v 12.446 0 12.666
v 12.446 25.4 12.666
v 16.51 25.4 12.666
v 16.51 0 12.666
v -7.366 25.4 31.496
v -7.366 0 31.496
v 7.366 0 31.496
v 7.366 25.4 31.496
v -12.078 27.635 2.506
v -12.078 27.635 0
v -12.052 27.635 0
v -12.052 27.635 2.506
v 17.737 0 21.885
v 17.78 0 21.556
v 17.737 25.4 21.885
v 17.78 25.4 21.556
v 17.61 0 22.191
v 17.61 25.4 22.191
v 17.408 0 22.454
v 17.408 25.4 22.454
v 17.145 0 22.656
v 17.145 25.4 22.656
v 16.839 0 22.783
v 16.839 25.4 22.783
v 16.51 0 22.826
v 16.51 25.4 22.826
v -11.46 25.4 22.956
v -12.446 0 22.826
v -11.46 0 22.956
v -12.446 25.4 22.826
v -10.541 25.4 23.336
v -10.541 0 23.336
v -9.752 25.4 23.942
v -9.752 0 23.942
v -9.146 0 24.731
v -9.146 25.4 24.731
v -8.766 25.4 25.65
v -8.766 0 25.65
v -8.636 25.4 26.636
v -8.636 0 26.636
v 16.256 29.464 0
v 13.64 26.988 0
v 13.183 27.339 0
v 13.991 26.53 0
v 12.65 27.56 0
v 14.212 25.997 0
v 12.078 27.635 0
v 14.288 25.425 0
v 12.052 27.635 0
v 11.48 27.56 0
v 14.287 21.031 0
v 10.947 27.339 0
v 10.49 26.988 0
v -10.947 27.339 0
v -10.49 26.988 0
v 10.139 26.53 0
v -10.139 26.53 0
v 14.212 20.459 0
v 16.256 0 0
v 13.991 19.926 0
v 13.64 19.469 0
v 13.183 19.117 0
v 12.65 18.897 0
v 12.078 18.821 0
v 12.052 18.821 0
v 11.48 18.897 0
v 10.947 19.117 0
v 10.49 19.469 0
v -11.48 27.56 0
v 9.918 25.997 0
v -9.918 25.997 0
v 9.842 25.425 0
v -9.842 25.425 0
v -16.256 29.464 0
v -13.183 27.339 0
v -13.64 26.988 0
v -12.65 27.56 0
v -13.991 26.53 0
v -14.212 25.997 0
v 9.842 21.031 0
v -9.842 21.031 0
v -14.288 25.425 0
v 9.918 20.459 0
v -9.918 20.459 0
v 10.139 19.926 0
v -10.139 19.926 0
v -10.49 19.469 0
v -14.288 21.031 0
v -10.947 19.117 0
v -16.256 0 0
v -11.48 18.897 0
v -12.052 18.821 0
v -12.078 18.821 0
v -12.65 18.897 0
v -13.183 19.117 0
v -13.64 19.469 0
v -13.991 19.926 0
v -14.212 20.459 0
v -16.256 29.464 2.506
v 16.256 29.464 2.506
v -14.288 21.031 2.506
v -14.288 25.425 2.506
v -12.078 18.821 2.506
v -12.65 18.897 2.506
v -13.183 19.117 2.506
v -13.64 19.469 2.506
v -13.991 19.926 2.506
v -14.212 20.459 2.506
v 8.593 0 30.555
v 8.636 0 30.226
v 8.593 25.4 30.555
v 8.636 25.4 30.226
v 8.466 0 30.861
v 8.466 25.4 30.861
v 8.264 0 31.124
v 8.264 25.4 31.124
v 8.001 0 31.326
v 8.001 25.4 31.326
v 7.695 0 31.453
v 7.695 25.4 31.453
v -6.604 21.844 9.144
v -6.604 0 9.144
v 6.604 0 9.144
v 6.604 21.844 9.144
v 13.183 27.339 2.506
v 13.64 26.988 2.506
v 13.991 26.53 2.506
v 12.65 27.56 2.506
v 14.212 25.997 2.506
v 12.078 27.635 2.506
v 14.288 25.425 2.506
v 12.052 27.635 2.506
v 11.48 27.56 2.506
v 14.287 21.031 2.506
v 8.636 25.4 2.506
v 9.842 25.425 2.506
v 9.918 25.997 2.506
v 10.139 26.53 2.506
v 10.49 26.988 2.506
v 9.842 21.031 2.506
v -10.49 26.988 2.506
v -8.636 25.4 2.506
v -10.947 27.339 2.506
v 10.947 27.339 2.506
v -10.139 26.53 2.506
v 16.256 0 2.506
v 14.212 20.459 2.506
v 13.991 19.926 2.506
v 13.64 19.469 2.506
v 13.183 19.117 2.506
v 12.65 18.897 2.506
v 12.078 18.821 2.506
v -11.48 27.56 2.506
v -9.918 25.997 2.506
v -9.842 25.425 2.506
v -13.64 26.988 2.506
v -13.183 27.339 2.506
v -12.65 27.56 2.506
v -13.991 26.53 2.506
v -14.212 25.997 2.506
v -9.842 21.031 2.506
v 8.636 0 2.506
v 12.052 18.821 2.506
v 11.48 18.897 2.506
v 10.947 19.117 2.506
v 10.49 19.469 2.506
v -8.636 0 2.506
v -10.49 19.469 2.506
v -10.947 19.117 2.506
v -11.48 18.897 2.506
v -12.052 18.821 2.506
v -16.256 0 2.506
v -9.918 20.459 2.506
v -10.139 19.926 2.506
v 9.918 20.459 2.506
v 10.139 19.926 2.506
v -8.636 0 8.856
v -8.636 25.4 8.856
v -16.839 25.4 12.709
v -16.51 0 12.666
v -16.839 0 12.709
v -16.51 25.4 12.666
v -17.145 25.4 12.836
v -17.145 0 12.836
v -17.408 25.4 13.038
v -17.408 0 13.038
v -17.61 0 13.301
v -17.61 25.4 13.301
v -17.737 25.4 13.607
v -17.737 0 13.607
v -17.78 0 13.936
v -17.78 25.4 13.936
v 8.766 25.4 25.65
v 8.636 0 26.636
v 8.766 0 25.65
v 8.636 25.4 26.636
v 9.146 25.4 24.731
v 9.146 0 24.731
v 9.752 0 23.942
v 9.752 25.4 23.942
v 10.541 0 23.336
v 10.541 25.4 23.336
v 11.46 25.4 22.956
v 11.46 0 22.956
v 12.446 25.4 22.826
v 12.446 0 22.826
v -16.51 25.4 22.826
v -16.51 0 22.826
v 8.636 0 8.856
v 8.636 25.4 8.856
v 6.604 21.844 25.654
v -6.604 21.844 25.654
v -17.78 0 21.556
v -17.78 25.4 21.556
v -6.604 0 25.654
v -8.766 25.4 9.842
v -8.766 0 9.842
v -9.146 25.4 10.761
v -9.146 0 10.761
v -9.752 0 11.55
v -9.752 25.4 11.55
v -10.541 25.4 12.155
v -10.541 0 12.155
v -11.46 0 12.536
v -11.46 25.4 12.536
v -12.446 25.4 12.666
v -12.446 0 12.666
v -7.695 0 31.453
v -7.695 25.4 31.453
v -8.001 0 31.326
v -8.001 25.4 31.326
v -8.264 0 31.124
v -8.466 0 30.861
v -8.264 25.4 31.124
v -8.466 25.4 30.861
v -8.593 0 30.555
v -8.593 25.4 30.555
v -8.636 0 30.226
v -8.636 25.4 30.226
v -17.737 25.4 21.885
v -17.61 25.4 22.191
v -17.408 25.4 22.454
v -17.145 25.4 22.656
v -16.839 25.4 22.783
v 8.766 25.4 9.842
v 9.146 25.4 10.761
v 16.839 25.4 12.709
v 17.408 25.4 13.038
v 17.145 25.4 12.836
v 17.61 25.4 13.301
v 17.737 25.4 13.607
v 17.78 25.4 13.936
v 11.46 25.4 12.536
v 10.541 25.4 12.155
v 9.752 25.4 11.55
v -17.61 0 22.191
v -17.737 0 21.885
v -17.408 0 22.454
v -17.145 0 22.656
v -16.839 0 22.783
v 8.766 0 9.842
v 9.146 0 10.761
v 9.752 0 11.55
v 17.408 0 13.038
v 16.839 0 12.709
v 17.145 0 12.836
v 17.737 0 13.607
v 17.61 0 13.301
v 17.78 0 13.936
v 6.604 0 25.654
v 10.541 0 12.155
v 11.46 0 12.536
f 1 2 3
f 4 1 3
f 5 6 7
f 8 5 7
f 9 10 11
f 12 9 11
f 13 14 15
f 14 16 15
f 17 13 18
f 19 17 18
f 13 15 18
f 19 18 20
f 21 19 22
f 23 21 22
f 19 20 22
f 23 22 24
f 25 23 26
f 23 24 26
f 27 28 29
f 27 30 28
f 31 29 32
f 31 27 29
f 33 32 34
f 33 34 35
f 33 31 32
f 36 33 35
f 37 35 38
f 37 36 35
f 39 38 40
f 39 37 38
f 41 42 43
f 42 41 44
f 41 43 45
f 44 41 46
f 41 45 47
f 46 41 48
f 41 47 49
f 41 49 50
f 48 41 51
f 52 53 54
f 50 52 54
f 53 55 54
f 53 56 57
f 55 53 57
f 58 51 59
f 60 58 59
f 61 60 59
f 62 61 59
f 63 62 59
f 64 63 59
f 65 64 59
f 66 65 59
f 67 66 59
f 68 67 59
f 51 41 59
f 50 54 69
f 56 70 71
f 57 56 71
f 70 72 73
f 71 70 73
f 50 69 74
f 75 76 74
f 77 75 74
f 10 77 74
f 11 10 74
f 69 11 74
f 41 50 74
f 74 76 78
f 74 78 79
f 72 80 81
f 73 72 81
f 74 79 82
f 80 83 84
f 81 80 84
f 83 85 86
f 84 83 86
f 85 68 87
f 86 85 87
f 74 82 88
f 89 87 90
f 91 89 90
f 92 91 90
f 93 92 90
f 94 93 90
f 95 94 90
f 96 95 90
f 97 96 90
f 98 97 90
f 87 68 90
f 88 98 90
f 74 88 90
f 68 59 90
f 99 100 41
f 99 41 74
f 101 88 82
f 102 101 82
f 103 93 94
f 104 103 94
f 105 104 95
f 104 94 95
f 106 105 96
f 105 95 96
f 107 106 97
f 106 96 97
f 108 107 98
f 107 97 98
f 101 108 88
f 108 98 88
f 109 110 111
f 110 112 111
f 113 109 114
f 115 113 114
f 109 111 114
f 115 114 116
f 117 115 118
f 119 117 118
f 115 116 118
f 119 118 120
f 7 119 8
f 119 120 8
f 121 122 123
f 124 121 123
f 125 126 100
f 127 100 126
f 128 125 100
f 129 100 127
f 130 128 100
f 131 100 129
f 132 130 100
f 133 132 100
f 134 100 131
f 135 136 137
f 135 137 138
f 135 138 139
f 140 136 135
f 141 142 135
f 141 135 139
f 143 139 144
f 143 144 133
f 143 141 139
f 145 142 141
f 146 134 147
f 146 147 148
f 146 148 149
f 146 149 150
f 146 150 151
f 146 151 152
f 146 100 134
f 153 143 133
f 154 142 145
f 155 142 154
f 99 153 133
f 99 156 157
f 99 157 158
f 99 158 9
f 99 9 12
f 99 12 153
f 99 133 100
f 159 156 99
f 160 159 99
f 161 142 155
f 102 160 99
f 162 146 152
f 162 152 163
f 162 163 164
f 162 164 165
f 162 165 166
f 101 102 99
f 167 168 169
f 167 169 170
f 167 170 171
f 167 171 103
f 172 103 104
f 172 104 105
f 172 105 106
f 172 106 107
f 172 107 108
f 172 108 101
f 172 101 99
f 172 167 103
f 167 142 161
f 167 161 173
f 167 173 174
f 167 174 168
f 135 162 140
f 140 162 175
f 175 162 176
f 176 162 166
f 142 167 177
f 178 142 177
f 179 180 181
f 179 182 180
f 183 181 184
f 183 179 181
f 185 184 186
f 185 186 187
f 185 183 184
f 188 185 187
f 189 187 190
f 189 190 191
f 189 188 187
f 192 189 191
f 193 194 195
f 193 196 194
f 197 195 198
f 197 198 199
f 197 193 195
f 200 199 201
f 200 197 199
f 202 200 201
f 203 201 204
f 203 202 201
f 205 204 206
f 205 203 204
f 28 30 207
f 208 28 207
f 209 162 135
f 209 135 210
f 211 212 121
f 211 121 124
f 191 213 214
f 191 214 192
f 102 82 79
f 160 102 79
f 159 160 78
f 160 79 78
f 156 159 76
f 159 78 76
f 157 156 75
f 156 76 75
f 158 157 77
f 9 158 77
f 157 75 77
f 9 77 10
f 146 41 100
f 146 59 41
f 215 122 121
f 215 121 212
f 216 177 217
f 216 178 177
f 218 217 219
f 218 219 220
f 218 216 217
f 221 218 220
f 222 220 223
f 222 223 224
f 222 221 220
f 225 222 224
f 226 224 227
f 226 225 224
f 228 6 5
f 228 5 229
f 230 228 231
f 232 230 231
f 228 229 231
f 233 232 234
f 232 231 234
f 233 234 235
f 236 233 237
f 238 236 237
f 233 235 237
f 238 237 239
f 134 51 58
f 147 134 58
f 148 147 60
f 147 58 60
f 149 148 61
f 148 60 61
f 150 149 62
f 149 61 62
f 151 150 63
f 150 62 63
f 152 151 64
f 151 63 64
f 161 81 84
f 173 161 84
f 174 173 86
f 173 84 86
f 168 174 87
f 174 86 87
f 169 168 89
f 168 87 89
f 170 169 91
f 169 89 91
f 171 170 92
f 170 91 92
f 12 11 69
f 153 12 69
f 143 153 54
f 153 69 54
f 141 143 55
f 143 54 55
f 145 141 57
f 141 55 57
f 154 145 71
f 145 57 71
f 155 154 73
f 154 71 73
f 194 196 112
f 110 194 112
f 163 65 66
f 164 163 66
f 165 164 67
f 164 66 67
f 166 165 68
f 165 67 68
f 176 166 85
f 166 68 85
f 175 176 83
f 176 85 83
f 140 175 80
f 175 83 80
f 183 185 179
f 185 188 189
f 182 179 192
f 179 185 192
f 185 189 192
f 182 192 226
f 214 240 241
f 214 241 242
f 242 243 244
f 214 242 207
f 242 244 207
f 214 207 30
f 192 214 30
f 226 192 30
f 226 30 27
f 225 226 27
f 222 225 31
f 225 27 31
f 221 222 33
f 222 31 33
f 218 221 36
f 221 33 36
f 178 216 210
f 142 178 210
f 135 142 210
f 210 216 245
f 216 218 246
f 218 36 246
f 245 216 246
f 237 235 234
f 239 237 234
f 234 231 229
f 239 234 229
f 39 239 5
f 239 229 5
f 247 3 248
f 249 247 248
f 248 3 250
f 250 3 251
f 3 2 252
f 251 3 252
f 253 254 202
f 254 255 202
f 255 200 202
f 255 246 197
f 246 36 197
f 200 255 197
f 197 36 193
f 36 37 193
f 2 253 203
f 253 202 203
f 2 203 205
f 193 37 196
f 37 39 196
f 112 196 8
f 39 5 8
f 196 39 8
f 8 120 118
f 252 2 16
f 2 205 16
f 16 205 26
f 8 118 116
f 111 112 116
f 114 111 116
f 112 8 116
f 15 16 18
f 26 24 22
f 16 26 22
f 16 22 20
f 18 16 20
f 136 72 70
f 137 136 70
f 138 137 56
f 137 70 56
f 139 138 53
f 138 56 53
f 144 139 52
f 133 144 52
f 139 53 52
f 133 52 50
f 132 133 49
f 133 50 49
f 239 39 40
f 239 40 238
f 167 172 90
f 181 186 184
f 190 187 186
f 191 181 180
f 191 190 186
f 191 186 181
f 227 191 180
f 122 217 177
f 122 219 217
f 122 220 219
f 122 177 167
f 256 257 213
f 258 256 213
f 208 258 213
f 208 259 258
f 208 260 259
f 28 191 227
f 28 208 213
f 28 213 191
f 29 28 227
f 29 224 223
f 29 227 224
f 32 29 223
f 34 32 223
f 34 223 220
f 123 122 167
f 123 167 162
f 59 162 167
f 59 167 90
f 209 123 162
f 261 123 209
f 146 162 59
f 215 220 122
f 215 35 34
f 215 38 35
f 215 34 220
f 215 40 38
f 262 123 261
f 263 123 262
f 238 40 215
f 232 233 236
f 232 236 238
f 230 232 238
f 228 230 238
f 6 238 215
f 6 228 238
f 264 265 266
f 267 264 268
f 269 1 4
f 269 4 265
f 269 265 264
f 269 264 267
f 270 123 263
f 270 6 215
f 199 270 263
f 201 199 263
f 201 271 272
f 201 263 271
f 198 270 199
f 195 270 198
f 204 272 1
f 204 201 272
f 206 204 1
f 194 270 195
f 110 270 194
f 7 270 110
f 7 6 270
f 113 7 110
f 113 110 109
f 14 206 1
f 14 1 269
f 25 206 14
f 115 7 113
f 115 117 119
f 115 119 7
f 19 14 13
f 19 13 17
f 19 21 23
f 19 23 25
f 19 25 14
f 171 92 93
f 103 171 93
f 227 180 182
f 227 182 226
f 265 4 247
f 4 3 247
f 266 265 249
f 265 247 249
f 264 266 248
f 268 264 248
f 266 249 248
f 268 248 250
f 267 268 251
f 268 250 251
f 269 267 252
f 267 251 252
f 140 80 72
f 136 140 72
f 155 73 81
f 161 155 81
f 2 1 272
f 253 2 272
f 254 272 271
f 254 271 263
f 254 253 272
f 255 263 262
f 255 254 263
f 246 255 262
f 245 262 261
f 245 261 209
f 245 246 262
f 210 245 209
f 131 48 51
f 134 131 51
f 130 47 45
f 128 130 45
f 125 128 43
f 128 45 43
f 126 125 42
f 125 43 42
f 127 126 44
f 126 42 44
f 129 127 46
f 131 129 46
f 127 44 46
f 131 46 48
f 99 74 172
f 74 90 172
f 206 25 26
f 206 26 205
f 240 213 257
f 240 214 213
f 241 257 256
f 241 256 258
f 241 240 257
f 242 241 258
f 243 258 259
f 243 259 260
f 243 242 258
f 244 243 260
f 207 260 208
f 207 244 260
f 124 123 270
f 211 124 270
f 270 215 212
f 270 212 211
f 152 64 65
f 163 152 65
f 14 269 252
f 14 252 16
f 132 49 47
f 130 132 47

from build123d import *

# Parameters (mm, degrees)
F0_W     = 17.272
F0_H     = 10.16
F0_H_2   = 8.670134
F1_DEPTH = 25.4
F2_W     = 32.512
F2_H     = 2.505866
F3_DEPTH = 4.064
F4_R     = 3.81
F5_R     = 1.27
F6_W     = 13.208
F6_H     = 16.51
F7_DEPTH = 21.844
F9_DEPTH = 5.08


with BuildPart() as f1:
    # F0 (on Front) → F1 (new body)
    with BuildSketch(Plane.XZ):
        Polygon((-16.256, 2.505866), (-16.256, 0), (16.256, 0), (16.256, 2.505866), (8.636, 2.505866), (-8.636, 2.505866), align=None)
        with Locations((0, 7.585866)):
            Rectangle(F0_W, F0_H)
        Polygon((-17.78, 12.665866), (-8.636, 12.665866), (8.636, 12.665866), (17.78, 12.665866), (17.78, 22.825866), (8.636, 22.825866), (-8.636, 22.825866), (-17.78, 22.825866), align=None)
        with Locations((0, 27.160933)):
            Rectangle(F0_W, F0_H_2)
    extrude(amount=-F1_DEPTH)

    # F2 (on face) → F3 (join)
    with BuildSketch(Plane(origin=(0, 25.4, 0), x_dir=(-1, 0, 0), z_dir=(0, 1, 0))):
        with Locations((0, 1.252933)):
            Rectangle(F2_W, F2_H)
    extrude(amount=F3_DEPTH)

    # F4
    f4_edges = [f1.edges().sort_by_distance(p)[0] for p in [
        (-8.636, 12.7, 22.825866),
        (-8.636, 12.7, 12.665866),
        (8.636, 12.7, 12.665866),
        (8.636, 12.7, 22.825866),
    ]]
    fillet(f4_edges, radius=F4_R)

    # F5
    f5_edges = [f1.edges().sort_by_distance(p)[0] for p in [
        (-8.636, 12.7, 31.496),
        (8.636, 12.7, 31.496),
        (17.78, 12.7, 22.825866),
        (17.78, 12.7, 12.665866),
        (-17.78, 12.7, 12.665866),
        (-17.78, 12.7, 22.825866),
    ]]
    fillet(f5_edges, radius=F5_R)

    # F6 (on face) → F7 (cut)
    with BuildSketch(Plane.XZ):
        with Locations((0, 17.399)):
            Rectangle(F6_W, F6_H)
    extrude(amount=-F7_DEPTH, mode=Mode.SUBTRACT)

    # F8 (on face) → F9 (cut)
    with BuildSketch(Plane(origin=(0, 0, 0), x_dir=(1, 0, 0), z_dir=(0, 0, -1))):
        with BuildLine():
            ThreePointArc((-14.2875, -25.4254), (-13.640265, -26.987965), (-12.0777, -27.6352))
            Line((-12.0777, -27.6352), (-12.0523, -27.6352))
            ThreePointArc((-12.0523, -27.6352), (-10.489735, -26.987965), (-9.8425, -25.4254))
            Line((-9.8425, -25.4254), (-9.8425, -21.0312))
            ThreePointArc((-9.8425, -21.0312), (-10.489735, -19.468635), (-12.0523, -18.8214))
            Line((-12.0523, -18.8214), (-12.0777, -18.8214))
            ThreePointArc((-12.0777, -18.8214), (-13.640265, -19.468635), (-14.2875, -21.0312))
            Line((-14.2875, -21.0312), (-14.2875, -25.4254))
        make_face()
        with BuildLine():
            Line((12.0777, -18.8214), (12.0523, -18.8214))
            ThreePointArc((12.0523, -18.8214), (10.489735, -19.468635), (9.8425, -21.0312))
            Line((9.8425, -21.0312), (9.8425, -25.4254))
            ThreePointArc((9.8425, -25.4254), (10.489735, -26.987965), (12.0523, -27.6352))
            Line((12.0523, -27.6352), (12.0777, -27.6352))
            ThreePointArc((12.0777, -27.6352), (13.640265, -26.987965), (14.2875, -25.4254))
            Line((14.2875, -25.4254), (14.2875, -21.0312))
            ThreePointArc((14.2875, -21.0312), (13.640265, -19.468635), (12.0777, -18.8214))
        make_face()
    extrude(amount=-F9_DEPTH, mode=Mode.SUBTRACT)


solid = f1.part
